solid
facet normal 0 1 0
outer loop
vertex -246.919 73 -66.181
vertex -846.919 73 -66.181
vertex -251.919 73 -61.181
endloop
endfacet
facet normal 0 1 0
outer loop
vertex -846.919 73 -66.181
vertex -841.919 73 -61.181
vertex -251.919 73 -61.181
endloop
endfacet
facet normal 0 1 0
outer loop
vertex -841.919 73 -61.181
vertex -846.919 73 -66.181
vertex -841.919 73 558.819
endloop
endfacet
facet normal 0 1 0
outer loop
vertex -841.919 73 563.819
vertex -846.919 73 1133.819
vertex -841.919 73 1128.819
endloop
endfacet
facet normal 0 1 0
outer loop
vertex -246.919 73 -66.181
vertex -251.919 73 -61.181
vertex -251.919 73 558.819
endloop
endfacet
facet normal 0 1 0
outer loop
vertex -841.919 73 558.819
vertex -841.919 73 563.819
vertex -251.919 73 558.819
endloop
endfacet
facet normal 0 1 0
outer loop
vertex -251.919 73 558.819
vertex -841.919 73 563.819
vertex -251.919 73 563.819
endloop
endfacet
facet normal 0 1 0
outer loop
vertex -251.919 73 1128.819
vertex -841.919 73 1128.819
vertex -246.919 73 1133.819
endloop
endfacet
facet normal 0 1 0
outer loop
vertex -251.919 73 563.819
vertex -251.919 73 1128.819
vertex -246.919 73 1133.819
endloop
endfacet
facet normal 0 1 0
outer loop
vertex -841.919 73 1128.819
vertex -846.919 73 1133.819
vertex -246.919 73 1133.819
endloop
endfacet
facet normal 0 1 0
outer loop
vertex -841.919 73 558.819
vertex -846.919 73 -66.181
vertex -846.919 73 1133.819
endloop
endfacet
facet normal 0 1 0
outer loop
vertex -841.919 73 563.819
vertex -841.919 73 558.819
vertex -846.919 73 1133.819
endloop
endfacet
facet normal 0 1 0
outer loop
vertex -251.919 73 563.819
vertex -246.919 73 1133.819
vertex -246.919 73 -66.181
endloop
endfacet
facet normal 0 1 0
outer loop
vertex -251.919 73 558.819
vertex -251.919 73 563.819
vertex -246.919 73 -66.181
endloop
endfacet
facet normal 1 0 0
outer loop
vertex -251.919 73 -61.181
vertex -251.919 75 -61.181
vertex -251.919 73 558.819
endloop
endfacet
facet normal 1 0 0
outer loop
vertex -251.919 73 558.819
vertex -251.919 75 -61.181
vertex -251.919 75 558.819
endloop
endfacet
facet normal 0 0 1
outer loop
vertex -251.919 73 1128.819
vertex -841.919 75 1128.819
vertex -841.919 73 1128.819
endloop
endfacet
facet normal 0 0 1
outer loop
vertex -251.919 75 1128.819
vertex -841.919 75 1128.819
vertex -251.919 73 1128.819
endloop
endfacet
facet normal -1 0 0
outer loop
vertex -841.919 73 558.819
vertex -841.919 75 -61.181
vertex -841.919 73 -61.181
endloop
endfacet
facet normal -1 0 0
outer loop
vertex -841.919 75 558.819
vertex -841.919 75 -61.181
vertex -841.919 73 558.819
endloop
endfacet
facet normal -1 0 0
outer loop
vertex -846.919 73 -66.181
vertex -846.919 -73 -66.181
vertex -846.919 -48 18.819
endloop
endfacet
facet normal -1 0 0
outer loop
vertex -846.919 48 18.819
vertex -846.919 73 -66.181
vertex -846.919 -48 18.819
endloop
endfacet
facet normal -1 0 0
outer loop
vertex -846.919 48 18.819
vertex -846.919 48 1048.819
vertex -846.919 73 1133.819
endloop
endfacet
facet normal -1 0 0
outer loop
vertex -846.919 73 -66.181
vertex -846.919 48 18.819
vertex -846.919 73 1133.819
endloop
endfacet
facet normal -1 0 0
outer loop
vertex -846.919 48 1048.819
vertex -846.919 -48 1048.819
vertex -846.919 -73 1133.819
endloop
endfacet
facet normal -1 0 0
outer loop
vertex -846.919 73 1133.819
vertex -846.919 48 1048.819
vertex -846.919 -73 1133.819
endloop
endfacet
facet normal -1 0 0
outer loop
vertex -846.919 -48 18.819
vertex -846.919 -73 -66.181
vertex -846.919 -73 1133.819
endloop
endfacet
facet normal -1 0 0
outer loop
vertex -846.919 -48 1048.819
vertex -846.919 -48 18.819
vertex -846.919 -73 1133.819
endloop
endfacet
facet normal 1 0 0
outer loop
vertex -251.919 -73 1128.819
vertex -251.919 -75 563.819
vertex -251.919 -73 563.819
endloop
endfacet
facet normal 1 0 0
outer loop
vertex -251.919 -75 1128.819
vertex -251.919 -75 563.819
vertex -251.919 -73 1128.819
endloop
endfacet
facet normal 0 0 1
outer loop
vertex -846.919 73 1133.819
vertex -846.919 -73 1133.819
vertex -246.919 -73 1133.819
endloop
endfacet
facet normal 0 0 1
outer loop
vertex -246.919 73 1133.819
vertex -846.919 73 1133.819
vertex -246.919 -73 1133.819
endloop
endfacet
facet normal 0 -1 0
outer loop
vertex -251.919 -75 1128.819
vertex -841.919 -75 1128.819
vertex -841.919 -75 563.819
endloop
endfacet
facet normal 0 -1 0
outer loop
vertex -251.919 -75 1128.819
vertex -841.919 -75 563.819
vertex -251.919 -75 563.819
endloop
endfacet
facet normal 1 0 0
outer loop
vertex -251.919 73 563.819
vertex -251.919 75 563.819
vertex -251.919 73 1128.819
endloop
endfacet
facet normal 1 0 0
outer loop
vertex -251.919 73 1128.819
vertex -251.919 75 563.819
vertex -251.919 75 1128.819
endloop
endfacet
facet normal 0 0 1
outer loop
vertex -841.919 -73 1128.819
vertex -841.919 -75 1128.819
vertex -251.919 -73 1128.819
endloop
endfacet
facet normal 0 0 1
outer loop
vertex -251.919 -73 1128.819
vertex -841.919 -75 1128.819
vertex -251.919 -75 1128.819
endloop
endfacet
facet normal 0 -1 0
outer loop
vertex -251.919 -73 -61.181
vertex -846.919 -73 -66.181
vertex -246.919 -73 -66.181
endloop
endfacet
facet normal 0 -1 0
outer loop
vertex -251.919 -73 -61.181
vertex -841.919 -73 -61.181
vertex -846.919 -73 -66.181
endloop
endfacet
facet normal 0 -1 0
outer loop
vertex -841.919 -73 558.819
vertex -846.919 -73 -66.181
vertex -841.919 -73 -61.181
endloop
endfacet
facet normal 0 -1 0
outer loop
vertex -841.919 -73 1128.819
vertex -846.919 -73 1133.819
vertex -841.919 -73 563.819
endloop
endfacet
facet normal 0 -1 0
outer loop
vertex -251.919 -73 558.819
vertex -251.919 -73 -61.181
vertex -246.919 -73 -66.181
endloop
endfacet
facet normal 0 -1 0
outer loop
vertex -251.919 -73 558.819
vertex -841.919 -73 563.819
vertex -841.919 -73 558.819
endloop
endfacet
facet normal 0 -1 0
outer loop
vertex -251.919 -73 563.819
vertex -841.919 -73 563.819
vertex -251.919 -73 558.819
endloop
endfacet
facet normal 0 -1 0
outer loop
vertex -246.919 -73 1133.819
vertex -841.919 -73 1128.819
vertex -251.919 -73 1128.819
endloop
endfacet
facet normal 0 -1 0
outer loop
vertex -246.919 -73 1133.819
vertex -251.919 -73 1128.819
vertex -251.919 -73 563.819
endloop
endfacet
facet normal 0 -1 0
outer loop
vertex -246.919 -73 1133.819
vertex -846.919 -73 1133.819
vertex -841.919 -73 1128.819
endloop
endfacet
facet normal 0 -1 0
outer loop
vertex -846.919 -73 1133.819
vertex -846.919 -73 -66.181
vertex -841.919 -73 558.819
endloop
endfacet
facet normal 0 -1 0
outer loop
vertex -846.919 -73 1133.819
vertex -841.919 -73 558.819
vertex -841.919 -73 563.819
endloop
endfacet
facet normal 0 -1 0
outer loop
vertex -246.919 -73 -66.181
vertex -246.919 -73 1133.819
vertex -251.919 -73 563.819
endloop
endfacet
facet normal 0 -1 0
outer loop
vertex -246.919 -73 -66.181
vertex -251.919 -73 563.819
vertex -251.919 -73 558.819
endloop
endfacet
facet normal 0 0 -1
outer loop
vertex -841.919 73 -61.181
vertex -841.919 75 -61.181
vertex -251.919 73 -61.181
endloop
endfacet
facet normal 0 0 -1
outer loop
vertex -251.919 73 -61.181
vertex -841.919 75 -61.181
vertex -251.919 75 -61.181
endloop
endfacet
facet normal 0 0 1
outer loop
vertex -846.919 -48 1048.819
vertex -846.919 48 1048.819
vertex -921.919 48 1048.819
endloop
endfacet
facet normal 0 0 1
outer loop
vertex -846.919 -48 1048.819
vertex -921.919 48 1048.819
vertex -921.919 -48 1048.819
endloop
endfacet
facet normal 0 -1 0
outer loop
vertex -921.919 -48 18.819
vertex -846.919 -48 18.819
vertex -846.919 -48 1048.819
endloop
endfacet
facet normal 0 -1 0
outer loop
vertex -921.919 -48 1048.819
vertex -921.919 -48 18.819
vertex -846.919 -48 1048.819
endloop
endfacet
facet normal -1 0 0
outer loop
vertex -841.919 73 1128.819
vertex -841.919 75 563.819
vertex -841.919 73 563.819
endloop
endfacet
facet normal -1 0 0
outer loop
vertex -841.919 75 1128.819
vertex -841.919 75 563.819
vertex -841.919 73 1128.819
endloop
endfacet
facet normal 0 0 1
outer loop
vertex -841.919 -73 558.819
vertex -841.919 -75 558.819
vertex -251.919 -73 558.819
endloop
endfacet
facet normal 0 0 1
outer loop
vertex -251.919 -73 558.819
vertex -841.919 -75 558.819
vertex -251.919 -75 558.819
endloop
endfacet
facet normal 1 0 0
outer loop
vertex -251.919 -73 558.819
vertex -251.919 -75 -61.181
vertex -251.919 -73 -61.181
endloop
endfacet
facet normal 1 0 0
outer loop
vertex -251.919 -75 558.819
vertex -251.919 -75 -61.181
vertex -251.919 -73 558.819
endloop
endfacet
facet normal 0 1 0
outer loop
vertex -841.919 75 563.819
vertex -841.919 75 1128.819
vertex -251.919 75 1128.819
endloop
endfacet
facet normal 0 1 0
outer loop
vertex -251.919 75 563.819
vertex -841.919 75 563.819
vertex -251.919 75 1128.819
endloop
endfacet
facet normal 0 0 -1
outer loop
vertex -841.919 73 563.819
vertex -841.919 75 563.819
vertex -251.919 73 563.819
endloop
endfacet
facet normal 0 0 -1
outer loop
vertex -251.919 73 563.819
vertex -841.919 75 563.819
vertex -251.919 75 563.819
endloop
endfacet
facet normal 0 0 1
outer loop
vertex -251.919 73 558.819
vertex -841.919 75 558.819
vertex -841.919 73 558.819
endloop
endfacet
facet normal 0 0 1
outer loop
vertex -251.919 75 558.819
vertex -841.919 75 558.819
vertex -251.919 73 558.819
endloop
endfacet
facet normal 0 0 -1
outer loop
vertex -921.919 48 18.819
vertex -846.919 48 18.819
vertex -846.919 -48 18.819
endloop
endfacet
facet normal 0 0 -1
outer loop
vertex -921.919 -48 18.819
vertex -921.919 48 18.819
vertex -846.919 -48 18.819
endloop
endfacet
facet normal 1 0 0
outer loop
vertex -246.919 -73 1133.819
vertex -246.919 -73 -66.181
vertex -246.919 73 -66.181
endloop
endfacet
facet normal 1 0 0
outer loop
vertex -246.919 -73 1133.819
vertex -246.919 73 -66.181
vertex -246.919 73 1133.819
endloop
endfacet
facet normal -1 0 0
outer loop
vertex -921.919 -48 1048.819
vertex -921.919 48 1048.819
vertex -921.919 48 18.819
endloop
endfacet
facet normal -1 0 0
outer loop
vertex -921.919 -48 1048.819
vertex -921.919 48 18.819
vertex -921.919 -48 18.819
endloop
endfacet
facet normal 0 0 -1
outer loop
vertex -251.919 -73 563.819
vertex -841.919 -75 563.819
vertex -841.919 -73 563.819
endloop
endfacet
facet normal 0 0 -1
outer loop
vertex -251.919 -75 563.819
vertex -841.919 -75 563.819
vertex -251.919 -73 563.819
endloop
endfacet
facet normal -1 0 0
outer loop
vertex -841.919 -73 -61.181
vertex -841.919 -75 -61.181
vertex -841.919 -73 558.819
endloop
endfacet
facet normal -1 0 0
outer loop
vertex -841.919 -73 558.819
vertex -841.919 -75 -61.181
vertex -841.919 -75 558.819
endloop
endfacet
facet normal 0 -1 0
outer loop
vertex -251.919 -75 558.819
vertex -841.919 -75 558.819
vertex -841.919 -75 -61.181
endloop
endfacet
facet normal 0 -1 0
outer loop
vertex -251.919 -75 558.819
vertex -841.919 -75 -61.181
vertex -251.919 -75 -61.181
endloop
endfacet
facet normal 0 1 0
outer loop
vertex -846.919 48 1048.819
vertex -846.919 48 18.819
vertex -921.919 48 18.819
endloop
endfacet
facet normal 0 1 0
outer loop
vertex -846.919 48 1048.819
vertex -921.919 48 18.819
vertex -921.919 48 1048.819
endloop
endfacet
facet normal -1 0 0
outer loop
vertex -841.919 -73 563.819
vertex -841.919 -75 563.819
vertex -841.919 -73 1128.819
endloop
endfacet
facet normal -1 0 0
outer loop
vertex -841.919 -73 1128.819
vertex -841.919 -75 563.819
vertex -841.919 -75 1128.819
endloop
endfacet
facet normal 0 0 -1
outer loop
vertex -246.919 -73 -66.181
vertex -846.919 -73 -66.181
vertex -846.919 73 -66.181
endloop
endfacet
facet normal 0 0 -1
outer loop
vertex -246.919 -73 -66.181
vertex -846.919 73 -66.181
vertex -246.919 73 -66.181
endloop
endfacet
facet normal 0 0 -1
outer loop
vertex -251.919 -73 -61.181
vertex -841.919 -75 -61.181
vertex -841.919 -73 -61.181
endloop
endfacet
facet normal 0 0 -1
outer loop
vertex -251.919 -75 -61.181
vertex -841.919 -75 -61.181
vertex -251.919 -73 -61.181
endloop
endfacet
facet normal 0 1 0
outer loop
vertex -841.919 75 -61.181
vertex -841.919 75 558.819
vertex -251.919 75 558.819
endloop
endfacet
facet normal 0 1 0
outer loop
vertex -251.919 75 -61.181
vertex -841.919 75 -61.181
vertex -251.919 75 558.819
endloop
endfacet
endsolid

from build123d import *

# Parameters (mm, degrees)
F0_W     = 600
F0_H     = 1200
F1_DEPTH = 75
F2_W     = 600
F2_H     = 1200
F2_W_2   = 590
F2_H_2   = 620
F2_H_3   = 565
F3_DEPTH = 2
F4_W     = 96
F4_H     = 1030
F5_DEPTH = 75


# Not quite as in the source:
# - a pattern or mirror of a feature is missing from the dataset's text; its kind, count and spacing are read off the source's solid


with BuildPart() as f1:
    # F0 (on Front) → F1 (new body, symmetric)
    with BuildSketch(Plane.XZ):
        with Locations((-546.9189941883, 533.8190406561)):
            Rectangle(F0_W, F0_H)
    extrude(amount=F1_DEPTH, both=True)

    # F2 (on face) → F3 (cut)
    with BuildSketch(Plane.XZ.offset(75)):
        with Locations((-546.9189941883, 533.8190406561)):
            Rectangle(F2_W, F2_H)
        with Locations((-546.9189941883, 248.8190406561)):
            Rectangle(F2_W_2, F2_H_2, mode=Mode.SUBTRACT)
        with Locations((-546.9189941883, 846.3190406561)):
            Rectangle(F2_W_2, F2_H_3, mode=Mode.SUBTRACT)
    f3 = extrude(amount=-F3_DEPTH, mode=Mode.SUBTRACT)

    # F3_copies: F3 across plane
    add(f3.mirror(Plane.ZX), mode=Mode.SUBTRACT)

    # F4 (on face) → F5 (join)
    with BuildSketch(Plane(origin=(-846.9189941883, 0, 0), x_dir=(0, -1, 0), z_dir=(-1, 0, 0))):
        with Locations((0, 533.8190406561)):
            Rectangle(F4_W, F4_H)
    extrude(amount=F5_DEPTH)


solid = f1.part
